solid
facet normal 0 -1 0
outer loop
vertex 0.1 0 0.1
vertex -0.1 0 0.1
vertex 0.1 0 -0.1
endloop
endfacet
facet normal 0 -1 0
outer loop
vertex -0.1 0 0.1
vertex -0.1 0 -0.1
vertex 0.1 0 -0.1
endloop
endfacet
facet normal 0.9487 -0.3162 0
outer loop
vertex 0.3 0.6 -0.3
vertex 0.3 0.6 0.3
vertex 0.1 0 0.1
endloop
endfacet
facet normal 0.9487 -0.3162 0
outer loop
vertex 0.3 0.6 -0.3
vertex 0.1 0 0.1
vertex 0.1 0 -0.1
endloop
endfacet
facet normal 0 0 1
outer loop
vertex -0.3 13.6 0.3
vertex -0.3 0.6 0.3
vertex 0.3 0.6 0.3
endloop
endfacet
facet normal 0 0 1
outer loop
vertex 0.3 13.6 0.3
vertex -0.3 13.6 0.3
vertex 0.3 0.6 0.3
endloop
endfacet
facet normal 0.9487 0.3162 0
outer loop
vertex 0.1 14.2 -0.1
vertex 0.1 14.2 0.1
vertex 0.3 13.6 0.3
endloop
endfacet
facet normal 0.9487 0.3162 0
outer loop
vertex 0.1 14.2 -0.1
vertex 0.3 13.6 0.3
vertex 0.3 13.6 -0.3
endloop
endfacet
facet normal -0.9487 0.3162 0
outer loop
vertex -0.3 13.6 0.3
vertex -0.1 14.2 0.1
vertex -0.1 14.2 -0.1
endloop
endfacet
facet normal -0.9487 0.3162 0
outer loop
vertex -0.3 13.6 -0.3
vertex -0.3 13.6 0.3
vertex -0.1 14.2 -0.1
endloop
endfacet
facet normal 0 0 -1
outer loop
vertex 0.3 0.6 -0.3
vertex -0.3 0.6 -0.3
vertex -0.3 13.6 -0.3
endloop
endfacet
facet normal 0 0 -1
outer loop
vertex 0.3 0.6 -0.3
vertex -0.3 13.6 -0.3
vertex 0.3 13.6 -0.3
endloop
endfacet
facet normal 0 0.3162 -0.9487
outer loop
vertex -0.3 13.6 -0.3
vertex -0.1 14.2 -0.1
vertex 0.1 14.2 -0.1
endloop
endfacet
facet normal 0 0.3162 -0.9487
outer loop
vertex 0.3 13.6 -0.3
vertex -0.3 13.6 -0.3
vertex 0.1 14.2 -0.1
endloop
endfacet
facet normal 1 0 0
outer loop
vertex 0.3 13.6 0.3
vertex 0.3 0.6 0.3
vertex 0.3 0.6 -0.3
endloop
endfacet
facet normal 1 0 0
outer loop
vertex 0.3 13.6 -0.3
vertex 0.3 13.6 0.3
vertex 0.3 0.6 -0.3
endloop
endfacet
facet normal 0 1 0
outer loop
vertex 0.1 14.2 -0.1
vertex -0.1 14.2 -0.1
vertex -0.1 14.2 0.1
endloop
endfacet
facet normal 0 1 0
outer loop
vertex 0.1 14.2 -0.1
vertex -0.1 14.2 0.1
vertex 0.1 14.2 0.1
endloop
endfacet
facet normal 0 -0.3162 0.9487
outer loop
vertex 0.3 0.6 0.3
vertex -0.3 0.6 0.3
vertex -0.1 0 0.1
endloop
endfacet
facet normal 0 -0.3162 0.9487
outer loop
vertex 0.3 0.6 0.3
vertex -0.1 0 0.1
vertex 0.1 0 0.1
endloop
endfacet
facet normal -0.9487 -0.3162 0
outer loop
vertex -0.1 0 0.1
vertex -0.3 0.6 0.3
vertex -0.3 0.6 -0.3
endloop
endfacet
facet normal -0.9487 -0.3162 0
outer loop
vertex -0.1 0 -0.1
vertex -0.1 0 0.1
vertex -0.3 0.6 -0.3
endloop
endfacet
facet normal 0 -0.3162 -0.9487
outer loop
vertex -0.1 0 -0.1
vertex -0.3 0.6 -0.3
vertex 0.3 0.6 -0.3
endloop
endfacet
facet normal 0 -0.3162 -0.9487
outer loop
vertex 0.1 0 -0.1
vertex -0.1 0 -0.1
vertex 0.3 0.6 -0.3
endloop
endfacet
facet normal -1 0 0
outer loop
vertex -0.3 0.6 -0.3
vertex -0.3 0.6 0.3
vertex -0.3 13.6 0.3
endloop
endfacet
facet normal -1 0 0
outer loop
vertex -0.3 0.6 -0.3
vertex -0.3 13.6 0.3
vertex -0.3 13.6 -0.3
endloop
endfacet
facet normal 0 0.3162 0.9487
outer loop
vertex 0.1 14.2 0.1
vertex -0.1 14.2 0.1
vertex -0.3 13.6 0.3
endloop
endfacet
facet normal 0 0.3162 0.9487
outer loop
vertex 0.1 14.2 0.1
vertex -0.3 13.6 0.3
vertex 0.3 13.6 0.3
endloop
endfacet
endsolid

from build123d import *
from OCP.BRepFilletAPI import BRepFilletAPI_MakeChamfer

# Parameters (mm, degrees)
SKIZZE1_W                       = 0.6
SKIZZE1_H                       = 0.6
AUFSATZ_LINEAR_AUSTRAGEN1_DEPTH = 14.2
FASE1_SIZE                      = 0.6
FASE1_SIZE2                     = 0.2
FASE2_SIZE                      = 0.2
FASE2_SIZE2                     = 0.6


with BuildPart() as part:
    # Skizze1 → Aufsatz-Linear austragen1 (new body)
    with BuildSketch(Plane(origin=(0, 0, 0), x_dir=(1, 0, 0), z_dir=(0, 1, 0))):
        Rectangle(SKIZZE1_W, SKIZZE1_H)
    extrude(amount=AUFSATZ_LINEAR_AUSTRAGEN1_DEPTH)

    # Fase1: one chamfer whose edges measure the first distance from different faces: ONE call of the kernel's chamfer builder (chamfer() names one face for all edges)
    fase1_edges_1 = [part.edges().sort_by_distance(p)[0] for p in [
        (-0.3, 14.2, 0),
    ]]
    fase1_side_1 = [part.faces().sort_by_distance(p)[0] for p in [
        (-0.3, 7.1, 0),
    ]]
    fase1_edges_2 = [part.edges().sort_by_distance(p)[0] for p in [
        (0, 14.2, 0.3),
    ]]
    fase1_side_2 = [part.faces().sort_by_distance(p)[0] for p in [
        (0, 7.1, 0.3),
    ]]
    fase1_edges_3 = [part.edges().sort_by_distance(p)[0] for p in [
        (0.3, 14.2, 0),
    ]]
    fase1_side_3 = [part.faces().sort_by_distance(p)[0] for p in [
        (0.3, 7.1, 0),
    ]]
    fase1_edges_4 = [part.edges().sort_by_distance(p)[0] for p in [
        (0, 14.2, -0.3),
    ]]
    fase1_side_4 = [part.faces().sort_by_distance(p)[0] for p in [
        (0, 7.1, -0.3),
    ]]
    fase1 = BRepFilletAPI_MakeChamfer(part.part.solid().wrapped)
    for e in fase1_edges_1:
        fase1.Add(FASE1_SIZE, FASE1_SIZE2, e.wrapped, fase1_side_1[0].wrapped)  # the first distance lies on this face
    for e in fase1_edges_2:
        fase1.Add(FASE1_SIZE, FASE1_SIZE2, e.wrapped, fase1_side_2[0].wrapped)  # the first distance lies on this face
    for e in fase1_edges_3:
        fase1.Add(FASE1_SIZE, FASE1_SIZE2, e.wrapped, fase1_side_3[0].wrapped)  # the first distance lies on this face
    for e in fase1_edges_4:
        fase1.Add(FASE1_SIZE, FASE1_SIZE2, e.wrapped, fase1_side_4[0].wrapped)  # the first distance lies on this face
    add(Compound.cast(fase1.Shape()), mode=Mode.REPLACE)

    # Fase2
    fase2_edges = [part.edges().sort_by_distance(p)[0] for p in [
        (0, 0, 0.3),
        (-0.3, 0, 0),
        (0, 0, -0.3),
        (0.3, 0, 0),
    ]]
    fase2_side = [part.faces().sort_by_distance(p)[0] for p in [
        (0, 0, 0),
    ]]
    chamfer(fase2_edges, length=FASE2_SIZE, length2=FASE2_SIZE2, reference=fase2_side[0])


solid = part.part
